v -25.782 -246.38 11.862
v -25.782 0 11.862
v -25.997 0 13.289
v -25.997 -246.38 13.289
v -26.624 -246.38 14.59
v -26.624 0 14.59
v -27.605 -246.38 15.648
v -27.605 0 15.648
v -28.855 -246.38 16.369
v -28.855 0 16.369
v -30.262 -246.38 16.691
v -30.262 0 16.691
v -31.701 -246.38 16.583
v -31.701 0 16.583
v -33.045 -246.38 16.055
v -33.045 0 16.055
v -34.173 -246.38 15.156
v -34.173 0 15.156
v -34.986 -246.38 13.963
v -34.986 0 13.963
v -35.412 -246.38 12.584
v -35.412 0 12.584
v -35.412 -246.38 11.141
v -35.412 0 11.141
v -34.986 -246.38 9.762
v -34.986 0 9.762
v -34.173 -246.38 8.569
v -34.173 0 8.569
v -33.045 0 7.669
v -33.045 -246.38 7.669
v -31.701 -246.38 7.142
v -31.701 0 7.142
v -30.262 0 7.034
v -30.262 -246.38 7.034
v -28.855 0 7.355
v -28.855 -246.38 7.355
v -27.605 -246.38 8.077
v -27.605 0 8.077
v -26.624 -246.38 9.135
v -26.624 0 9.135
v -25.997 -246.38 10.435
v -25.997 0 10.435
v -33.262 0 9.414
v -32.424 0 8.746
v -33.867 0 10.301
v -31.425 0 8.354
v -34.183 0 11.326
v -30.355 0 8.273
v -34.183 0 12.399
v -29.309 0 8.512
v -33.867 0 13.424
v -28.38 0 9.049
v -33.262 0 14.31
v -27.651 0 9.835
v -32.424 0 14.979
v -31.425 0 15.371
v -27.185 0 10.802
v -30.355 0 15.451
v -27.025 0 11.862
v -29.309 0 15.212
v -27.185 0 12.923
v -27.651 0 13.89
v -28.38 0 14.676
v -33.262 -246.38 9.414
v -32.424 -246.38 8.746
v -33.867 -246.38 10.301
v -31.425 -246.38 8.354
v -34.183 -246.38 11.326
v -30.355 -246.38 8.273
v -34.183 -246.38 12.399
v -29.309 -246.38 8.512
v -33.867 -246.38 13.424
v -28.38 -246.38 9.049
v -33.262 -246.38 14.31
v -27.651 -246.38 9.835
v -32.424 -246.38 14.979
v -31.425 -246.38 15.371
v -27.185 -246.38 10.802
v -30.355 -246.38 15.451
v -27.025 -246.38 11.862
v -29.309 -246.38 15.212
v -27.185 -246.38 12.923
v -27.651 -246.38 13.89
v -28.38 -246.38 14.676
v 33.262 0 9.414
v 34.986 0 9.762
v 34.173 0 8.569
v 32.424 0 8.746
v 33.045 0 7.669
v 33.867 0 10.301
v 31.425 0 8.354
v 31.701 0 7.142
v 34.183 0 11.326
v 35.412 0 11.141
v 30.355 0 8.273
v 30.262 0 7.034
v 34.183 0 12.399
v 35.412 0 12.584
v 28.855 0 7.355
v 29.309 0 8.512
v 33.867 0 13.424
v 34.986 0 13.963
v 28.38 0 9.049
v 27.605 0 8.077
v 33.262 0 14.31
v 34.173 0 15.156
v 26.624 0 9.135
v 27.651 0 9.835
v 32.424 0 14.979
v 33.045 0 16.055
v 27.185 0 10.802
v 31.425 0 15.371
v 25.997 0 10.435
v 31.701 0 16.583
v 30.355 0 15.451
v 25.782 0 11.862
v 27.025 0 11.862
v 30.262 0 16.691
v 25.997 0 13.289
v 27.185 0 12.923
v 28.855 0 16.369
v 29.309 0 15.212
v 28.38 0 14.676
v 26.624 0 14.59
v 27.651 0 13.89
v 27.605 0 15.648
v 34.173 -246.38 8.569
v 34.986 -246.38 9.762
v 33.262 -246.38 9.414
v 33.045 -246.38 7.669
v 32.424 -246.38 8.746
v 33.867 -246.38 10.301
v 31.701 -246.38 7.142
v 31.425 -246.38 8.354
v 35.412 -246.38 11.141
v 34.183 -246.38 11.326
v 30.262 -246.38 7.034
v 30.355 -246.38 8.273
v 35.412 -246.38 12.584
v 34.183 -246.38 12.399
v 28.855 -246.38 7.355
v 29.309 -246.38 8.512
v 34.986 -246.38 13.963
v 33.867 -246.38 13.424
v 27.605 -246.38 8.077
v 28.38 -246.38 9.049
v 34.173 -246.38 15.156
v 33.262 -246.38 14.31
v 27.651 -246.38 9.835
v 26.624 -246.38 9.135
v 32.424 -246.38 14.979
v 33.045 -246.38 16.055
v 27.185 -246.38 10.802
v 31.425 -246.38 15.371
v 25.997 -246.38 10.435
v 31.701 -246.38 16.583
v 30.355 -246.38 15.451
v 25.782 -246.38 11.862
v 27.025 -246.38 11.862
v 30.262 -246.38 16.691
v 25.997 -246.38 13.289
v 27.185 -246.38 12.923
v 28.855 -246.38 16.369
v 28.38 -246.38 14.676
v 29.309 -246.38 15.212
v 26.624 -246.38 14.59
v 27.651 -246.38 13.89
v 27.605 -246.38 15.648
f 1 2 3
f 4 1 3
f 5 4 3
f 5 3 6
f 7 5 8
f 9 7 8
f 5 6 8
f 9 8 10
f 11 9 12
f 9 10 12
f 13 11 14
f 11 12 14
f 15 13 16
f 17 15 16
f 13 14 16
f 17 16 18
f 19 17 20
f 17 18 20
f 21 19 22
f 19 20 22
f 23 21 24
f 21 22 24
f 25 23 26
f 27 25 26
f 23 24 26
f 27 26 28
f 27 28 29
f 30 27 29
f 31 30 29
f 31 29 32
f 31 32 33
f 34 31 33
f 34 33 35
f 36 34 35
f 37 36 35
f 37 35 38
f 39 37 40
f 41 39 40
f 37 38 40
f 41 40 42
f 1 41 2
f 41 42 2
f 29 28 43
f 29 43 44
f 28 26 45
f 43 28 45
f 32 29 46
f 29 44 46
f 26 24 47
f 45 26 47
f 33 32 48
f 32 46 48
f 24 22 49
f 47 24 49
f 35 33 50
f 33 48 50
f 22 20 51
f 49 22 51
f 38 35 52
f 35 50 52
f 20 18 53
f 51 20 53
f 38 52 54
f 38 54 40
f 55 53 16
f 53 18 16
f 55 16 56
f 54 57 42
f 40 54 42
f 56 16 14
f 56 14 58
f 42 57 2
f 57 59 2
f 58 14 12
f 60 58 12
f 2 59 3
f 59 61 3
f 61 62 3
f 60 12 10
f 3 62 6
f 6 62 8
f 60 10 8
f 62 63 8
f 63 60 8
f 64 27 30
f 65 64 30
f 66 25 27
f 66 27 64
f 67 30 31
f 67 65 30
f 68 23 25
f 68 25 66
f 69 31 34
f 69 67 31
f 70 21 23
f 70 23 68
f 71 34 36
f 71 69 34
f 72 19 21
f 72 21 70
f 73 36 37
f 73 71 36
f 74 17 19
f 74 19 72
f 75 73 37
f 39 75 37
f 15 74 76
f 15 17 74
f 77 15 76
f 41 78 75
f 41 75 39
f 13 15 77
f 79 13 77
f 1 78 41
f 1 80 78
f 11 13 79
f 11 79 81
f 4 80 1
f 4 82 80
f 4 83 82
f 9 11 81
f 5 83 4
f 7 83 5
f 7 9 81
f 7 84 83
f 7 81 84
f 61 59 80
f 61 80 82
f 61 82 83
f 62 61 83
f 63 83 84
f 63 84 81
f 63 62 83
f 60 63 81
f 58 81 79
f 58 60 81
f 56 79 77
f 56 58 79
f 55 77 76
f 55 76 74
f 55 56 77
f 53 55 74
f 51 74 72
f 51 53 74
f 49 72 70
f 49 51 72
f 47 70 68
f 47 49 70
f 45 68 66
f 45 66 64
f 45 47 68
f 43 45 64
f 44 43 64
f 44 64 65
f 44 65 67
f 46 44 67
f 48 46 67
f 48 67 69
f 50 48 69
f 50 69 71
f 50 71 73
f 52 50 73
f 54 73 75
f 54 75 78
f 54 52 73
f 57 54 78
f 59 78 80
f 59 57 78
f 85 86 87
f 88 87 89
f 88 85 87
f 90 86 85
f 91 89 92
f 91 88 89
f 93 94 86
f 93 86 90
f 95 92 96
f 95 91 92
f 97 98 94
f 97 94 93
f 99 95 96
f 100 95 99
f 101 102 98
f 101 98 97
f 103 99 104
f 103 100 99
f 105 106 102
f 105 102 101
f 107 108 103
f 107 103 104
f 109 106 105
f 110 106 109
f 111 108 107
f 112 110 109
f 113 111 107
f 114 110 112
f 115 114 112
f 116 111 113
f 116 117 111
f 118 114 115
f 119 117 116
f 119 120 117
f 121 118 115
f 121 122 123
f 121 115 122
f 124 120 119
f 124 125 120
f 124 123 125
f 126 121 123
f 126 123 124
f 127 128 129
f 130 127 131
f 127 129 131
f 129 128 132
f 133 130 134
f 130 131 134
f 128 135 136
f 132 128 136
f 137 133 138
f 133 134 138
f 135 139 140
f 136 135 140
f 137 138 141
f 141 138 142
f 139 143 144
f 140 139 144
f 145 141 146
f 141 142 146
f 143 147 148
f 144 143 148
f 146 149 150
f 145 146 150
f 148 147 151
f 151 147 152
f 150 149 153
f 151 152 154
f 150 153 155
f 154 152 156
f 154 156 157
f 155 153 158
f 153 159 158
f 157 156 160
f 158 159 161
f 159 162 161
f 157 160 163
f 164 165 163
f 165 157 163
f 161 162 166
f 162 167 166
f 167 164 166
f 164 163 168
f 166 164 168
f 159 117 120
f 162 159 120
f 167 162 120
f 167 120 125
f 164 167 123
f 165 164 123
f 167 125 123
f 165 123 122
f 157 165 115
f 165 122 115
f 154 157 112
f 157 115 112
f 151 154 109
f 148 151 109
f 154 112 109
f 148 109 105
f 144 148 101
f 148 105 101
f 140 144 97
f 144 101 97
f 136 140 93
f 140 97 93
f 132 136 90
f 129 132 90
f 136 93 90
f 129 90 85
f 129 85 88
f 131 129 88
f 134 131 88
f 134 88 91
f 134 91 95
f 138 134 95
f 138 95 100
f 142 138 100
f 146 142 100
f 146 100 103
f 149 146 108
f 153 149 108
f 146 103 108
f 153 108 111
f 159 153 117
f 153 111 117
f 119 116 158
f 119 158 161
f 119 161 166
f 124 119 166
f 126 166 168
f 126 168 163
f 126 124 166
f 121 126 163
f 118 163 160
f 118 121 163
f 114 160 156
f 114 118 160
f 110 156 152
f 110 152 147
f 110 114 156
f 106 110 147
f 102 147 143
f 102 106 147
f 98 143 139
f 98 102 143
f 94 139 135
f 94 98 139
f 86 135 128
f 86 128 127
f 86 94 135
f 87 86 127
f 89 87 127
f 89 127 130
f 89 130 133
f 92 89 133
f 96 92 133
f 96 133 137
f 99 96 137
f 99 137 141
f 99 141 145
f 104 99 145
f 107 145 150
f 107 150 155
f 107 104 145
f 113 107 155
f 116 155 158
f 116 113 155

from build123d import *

# Parameters (mm, degrees)
F0_R     = 4.841753
F0_R_2   = 3.598893
F1_DEPTH = 246.38


with BuildPart() as f1:
    # F0 (on Front) → F1 (new body)
    with BuildSketch(Plane.XZ):
        with Locations((-30.624099, 11.862299)):
            Circle(F0_R)
        with Locations((-30.624099, 11.862299)):
            Circle(F0_R_2, mode=Mode.SUBTRACT)
    extrude(amount=F1_DEPTH)


with BuildPart() as f2_1:
    # F2: instance of F1
    add(f1.part.mirror(Plane.YZ))


solid = Compound([f1.part, f2_1.part])
